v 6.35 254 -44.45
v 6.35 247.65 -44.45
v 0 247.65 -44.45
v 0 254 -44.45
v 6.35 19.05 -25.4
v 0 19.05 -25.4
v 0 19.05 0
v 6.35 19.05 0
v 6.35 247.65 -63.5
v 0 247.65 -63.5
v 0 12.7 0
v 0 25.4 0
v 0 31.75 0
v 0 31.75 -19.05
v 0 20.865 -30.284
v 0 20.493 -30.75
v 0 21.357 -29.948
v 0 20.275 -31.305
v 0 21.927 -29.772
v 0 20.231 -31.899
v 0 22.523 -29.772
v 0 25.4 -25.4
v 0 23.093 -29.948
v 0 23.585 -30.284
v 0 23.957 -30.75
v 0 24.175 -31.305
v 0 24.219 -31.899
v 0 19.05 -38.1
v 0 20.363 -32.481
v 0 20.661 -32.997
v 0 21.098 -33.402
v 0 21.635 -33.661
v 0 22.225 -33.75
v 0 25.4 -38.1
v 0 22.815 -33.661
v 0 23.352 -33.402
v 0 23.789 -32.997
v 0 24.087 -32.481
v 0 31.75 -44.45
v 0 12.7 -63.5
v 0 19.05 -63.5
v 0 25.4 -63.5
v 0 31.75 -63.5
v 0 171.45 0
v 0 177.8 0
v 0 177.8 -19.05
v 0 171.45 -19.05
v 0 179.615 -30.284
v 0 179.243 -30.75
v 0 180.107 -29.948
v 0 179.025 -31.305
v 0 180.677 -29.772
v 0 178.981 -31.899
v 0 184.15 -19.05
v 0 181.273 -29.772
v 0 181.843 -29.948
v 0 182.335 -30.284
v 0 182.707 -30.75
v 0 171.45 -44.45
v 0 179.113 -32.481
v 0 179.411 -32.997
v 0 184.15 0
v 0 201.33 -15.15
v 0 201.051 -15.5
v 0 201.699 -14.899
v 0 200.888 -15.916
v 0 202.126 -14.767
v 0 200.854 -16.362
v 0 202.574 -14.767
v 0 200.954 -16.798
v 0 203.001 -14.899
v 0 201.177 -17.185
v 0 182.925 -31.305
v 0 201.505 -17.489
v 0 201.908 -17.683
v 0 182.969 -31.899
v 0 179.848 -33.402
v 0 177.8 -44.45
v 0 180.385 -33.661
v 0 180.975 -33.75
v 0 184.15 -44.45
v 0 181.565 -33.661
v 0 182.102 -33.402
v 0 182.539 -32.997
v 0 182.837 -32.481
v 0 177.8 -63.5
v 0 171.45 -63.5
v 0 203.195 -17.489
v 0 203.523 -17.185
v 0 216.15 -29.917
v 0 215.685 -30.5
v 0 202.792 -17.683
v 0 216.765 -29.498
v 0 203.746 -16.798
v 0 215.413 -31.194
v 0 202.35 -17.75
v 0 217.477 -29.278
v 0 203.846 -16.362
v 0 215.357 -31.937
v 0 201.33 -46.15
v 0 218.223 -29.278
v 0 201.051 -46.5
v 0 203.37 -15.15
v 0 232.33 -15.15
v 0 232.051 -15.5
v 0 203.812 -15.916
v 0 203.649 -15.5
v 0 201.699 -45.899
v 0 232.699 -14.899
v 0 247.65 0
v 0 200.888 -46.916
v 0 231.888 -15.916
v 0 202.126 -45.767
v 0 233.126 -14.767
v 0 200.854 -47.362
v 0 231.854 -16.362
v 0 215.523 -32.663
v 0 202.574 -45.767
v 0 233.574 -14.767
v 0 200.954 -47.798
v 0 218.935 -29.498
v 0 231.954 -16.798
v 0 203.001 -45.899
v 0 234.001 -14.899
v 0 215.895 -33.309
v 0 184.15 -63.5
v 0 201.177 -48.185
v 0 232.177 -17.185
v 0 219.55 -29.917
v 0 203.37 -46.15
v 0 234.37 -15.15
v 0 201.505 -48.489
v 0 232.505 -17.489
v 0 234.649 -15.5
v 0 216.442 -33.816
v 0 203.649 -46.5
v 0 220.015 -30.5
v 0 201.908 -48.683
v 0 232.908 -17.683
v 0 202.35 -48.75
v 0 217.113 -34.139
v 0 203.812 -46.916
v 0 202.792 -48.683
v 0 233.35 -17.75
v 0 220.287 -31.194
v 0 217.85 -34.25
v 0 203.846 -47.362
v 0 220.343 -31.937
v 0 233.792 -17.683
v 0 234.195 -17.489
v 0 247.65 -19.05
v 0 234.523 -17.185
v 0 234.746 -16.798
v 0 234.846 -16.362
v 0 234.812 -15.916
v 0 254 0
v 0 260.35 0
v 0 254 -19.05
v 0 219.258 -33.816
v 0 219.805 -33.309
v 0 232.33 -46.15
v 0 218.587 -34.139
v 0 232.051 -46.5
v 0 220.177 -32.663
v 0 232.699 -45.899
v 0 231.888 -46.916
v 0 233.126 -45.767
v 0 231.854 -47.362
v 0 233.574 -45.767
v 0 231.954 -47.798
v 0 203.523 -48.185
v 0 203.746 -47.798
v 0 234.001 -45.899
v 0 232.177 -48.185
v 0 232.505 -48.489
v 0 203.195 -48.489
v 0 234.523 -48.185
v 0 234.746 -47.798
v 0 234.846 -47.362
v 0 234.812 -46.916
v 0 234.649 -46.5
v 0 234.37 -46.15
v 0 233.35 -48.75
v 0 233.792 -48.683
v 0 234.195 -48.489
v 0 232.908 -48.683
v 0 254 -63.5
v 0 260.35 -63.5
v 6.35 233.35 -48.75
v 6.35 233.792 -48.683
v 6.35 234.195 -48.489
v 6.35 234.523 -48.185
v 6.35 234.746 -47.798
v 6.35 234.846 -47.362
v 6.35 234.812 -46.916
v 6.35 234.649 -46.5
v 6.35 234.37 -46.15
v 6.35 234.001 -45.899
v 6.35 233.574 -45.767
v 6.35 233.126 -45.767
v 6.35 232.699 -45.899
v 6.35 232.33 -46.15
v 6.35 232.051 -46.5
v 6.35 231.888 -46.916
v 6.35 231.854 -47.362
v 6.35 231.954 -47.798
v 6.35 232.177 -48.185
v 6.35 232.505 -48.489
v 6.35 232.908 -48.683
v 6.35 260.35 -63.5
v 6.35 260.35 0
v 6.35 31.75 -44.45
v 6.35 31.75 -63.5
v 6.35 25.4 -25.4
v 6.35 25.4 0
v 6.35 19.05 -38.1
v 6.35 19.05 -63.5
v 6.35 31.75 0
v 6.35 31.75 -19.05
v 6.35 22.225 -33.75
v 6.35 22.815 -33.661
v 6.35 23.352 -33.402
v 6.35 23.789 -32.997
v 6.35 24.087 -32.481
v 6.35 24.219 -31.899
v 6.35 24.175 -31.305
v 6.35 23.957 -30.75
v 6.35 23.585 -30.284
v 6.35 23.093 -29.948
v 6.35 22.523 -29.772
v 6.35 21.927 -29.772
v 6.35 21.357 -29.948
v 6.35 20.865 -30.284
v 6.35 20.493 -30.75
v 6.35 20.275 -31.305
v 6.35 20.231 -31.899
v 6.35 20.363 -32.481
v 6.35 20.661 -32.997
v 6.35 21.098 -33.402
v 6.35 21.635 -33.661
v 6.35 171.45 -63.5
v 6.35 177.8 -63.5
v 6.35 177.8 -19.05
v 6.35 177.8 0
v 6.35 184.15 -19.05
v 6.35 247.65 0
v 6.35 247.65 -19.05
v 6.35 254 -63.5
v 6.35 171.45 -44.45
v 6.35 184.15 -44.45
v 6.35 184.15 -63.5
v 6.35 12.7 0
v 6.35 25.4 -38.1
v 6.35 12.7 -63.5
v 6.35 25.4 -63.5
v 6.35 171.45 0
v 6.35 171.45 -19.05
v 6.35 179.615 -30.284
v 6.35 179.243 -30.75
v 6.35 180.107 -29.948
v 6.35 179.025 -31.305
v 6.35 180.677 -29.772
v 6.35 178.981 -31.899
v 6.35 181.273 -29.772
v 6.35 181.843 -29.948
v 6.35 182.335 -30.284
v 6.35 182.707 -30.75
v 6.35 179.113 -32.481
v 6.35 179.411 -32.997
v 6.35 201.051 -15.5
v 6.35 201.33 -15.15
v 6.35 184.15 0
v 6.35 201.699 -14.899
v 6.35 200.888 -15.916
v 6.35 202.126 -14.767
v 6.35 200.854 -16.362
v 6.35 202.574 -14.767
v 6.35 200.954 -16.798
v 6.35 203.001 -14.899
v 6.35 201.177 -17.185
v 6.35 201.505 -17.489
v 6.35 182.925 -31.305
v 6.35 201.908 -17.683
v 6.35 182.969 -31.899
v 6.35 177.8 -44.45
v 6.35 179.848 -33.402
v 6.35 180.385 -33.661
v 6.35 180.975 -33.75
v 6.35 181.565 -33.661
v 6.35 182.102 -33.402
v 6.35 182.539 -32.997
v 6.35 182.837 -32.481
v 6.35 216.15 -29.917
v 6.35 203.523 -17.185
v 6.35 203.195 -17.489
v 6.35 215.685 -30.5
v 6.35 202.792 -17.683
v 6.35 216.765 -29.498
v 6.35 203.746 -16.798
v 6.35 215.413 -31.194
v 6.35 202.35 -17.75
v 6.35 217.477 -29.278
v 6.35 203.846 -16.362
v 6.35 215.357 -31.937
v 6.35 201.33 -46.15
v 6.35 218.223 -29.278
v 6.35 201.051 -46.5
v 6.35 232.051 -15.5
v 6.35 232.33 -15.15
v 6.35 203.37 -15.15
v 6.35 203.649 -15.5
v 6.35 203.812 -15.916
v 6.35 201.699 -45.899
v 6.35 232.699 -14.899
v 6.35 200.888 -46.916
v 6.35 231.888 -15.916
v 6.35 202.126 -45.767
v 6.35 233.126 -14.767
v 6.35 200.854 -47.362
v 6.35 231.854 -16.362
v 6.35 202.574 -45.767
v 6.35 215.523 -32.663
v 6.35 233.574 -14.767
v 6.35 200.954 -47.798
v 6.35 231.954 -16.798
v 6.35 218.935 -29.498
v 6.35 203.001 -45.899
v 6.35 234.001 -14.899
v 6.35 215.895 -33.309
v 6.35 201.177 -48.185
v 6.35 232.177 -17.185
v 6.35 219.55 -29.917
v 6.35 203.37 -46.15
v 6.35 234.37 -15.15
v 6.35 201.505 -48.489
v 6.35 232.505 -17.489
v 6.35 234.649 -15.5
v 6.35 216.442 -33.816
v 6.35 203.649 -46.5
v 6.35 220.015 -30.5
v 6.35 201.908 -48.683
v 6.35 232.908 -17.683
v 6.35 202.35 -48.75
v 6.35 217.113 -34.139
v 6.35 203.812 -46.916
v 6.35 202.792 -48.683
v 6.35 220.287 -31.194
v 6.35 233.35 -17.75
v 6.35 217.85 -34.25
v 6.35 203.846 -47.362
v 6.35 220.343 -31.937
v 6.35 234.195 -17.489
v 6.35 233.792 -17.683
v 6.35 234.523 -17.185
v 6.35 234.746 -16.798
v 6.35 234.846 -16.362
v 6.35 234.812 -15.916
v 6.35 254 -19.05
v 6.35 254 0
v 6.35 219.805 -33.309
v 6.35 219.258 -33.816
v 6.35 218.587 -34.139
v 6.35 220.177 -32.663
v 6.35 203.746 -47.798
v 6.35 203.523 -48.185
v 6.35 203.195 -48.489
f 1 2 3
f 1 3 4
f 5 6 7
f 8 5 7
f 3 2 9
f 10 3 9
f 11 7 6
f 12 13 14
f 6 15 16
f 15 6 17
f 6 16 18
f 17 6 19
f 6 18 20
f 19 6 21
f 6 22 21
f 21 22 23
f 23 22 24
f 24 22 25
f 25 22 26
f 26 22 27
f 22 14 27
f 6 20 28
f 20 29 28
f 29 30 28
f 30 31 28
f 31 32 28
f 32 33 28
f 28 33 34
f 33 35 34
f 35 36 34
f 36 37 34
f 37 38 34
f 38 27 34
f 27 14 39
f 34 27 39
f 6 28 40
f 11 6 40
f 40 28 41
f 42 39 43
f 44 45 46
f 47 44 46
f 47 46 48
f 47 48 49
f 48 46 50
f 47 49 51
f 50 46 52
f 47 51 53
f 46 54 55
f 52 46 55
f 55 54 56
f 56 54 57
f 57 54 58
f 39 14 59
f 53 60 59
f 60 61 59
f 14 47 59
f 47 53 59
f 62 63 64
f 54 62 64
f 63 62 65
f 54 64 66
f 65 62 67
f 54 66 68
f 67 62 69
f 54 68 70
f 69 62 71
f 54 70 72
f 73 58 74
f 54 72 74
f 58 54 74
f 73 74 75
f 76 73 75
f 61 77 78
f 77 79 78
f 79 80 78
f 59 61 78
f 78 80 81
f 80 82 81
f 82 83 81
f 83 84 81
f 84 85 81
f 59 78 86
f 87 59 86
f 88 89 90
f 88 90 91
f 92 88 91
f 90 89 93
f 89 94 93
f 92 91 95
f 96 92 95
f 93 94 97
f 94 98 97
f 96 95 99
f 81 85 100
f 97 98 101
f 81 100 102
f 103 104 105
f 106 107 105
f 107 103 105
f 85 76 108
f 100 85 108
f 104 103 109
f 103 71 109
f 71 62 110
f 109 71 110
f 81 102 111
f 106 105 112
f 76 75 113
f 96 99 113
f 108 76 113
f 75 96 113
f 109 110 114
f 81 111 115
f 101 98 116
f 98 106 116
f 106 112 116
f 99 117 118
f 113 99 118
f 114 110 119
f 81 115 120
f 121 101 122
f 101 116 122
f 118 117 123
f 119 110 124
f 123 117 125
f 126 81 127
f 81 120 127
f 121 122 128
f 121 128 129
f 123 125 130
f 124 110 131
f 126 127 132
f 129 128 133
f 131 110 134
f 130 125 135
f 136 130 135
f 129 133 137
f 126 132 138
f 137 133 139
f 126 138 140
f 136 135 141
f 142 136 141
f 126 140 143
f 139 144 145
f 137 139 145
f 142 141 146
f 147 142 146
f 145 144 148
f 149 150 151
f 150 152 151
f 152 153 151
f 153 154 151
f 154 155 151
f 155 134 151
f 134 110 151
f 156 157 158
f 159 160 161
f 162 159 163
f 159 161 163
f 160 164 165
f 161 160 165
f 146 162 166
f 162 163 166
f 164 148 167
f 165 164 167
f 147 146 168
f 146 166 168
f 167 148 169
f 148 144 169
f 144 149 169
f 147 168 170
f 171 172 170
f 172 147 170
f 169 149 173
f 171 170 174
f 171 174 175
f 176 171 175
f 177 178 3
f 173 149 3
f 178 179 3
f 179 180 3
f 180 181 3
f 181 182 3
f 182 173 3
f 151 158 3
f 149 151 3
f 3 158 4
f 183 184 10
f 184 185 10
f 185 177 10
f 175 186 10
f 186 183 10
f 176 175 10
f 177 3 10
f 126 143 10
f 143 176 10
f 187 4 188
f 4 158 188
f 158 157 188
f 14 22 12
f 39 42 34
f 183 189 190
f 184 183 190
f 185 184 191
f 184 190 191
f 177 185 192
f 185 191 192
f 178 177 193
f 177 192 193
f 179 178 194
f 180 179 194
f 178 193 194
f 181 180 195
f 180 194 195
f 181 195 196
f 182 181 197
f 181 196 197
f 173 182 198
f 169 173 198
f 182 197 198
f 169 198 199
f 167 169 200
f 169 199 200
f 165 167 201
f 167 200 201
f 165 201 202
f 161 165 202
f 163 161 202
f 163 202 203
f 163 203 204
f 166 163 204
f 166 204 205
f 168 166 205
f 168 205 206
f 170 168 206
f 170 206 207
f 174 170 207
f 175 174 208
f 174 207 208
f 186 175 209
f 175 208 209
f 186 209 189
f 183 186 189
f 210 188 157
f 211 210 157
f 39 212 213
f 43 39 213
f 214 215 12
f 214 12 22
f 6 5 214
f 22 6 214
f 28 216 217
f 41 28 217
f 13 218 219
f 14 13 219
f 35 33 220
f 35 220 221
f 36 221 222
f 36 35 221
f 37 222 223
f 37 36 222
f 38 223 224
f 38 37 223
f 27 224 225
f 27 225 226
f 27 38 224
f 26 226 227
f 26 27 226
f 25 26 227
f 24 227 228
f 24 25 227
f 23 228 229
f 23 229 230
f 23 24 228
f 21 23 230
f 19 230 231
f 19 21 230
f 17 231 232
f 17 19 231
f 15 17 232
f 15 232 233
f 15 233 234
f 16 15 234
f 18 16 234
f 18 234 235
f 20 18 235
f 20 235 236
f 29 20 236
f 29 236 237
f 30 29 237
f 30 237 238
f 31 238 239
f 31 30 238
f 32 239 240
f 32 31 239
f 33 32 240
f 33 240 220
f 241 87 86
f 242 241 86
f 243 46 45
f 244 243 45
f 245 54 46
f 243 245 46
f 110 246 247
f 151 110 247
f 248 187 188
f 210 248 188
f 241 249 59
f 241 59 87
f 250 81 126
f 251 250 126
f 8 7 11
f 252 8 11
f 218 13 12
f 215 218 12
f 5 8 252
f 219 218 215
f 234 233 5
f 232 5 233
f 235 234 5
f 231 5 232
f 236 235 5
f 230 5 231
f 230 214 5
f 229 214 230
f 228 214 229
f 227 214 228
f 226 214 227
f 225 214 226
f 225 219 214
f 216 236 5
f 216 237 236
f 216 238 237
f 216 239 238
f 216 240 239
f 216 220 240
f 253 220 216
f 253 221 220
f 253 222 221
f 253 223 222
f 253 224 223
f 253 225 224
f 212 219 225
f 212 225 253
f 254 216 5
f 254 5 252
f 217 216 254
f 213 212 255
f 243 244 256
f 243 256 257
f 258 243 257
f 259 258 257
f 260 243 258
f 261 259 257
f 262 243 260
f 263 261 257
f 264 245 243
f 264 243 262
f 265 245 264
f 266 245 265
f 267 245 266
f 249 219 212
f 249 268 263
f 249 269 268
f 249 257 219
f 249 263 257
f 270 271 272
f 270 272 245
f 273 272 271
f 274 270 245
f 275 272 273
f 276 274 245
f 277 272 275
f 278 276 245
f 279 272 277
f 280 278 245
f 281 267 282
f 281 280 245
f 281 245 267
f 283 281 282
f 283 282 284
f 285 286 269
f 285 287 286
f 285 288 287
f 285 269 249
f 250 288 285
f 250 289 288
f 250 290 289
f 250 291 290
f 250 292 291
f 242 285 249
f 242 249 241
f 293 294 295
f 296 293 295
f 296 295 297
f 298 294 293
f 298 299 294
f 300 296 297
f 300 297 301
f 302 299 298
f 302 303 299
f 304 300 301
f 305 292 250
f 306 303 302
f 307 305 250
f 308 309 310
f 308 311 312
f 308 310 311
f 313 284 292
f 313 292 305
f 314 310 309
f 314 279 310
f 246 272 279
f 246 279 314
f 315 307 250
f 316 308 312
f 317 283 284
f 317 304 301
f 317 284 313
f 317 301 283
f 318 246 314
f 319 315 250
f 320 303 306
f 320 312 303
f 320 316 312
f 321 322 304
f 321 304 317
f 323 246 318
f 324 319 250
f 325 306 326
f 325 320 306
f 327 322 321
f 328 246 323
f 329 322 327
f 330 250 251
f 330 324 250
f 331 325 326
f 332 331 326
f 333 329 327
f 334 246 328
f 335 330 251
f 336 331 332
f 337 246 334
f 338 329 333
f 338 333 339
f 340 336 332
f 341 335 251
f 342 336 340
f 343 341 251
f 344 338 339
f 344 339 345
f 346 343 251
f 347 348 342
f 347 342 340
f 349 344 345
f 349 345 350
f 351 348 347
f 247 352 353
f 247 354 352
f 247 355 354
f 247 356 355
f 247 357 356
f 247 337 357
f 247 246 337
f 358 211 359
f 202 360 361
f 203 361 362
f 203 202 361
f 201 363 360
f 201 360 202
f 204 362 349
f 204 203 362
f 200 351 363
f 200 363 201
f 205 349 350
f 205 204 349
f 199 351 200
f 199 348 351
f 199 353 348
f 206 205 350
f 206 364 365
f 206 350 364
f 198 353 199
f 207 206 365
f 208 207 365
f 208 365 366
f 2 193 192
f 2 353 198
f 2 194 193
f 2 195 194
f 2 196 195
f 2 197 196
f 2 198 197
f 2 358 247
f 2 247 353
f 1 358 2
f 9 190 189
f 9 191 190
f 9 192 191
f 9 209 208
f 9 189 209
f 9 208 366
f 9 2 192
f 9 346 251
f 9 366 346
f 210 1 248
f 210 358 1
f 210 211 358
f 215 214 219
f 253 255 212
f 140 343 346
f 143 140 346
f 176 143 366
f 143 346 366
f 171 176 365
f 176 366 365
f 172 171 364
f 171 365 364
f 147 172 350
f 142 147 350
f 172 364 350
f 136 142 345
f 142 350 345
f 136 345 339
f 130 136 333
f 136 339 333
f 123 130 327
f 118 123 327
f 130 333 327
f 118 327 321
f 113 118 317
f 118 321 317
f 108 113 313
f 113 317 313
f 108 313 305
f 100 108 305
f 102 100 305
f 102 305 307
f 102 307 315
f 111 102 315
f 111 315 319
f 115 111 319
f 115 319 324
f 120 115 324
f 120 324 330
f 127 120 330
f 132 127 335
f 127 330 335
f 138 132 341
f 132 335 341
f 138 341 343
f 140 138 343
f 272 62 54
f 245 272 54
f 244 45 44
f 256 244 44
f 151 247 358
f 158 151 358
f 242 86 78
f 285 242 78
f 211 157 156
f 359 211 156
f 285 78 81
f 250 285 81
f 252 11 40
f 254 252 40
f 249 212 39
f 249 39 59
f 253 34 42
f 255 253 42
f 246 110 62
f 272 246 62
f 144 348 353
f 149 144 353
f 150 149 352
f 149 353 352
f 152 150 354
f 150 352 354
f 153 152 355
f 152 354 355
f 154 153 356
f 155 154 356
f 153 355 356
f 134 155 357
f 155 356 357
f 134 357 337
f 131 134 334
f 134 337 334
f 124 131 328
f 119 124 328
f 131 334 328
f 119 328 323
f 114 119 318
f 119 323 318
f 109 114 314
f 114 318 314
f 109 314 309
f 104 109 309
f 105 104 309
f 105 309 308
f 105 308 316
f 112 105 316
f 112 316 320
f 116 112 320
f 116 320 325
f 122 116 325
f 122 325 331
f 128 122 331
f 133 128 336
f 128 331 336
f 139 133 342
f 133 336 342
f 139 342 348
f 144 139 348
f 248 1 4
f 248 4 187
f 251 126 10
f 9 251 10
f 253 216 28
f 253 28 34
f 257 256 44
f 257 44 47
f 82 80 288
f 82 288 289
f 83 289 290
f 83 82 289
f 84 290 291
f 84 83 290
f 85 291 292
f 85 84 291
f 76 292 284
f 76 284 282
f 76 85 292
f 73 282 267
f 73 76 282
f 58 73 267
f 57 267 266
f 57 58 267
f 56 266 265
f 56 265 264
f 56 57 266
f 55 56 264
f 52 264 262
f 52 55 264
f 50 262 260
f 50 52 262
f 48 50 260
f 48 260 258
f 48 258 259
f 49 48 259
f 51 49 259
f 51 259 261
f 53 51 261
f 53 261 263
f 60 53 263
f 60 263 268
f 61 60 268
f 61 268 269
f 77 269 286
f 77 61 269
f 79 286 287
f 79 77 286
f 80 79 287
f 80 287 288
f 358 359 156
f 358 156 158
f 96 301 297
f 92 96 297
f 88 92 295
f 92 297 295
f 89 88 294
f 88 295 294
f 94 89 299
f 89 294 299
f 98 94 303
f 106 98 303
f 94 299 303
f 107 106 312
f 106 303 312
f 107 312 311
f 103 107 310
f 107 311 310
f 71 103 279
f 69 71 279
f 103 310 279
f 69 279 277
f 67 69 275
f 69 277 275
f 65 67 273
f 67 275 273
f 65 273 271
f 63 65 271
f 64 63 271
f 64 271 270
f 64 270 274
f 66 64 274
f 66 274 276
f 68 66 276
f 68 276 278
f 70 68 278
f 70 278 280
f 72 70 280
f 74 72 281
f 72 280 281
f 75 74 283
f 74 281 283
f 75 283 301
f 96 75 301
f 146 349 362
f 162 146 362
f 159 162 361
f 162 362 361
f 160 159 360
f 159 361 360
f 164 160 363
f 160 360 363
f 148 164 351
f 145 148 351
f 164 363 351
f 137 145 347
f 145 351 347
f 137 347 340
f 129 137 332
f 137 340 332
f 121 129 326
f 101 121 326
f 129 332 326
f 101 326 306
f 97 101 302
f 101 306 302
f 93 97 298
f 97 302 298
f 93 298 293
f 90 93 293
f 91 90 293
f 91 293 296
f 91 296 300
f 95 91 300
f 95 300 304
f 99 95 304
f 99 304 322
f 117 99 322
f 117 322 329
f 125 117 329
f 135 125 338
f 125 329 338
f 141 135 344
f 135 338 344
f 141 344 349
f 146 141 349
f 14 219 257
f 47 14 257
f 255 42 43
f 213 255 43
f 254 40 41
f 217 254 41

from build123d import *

# Parameters (mm, degrees)
SKETCH1_R           = 2
BOSS_EXTRUDE1_DEPTH = 6.35
SKETCH3_W           = 19.05
SKETCH3_H           = 139.7
CUT_EXTRUDE2_DEPTH  = 6.35
SKETCH2_R           = 1.500000048
SKETCH2_R_2         = 2.5
CUT_EXTRUDE3_DEPTH  = 6.35
SKETCH4_W           = 6.35
SKETCH4_H           = 6.35
CUT_EXTRUDE4_DEPTH  = 6.35
SKETCH5_W           = 19.05
SKETCH5_H           = 6.35
CUT_EXTRUDE5_DEPTH  = 6.35


with BuildPart() as part:
    # Sketch1 → Boss-Extrude1 (new body)
    with BuildSketch(Plane(origin=(0, 0, 0), x_dir=(0, 0, -1), z_dir=(1, 0, 0))):
        Polygon((63.5, 184.15), (63.5, 215.9), (63.5, 228.6), (63.5, 254), (63.5, 260.35), (0, 260.35), (0, 254), (0, 228.6), (0, 215.9), (0, 184.15), (19.05, 184.15), (19.05, 177.8), (0, 177.8), (0, 25.4), (19.05, 25.4), (19.05, 19.05), (0, 19.05), (0, 12.7), (61.867851021, 12.7), (63.5, 12.7), (63.5, 19.05), (57.15, 19.05), (44.45, 19.05), (44.45, 25.4), (57.15, 25.4), (63.5, 25.4), (63.5, 177.8), (44.45, 177.8), (44.45, 184.15), align=None)
        with Locations((31.75, 180.975)):
            Circle(SKETCH1_R, mode=Mode.SUBTRACT)
        with Locations((31.75, 22.225)):
            Circle(SKETCH1_R, mode=Mode.SUBTRACT)
    extrude(amount=BOSS_EXTRUDE1_DEPTH)

    # Sketch3 → Cut-Extrude2 (cut)
    with BuildSketch(Plane(origin=(6.35, 0, 0), x_dir=(0, 0, -1), z_dir=(1, 0, 0))):
        with Locations((9.525, 101.6)):
            Rectangle(SKETCH3_W, SKETCH3_H)
        with Locations((53.975, 101.6)):
            Rectangle(SKETCH3_W, SKETCH3_H)
    extrude(amount=-CUT_EXTRUDE2_DEPTH, mode=Mode.SUBTRACT)

    # Sketch2 → Cut-Extrude3 (cut)
    with BuildSketch(Plane(origin=(6.35, 0, 0), x_dir=(0, 0, -1), z_dir=(1, 0, 0))):
        with Locations((47.250000115, 233.350000152)):
            Circle(SKETCH2_R)
        with Locations((31.75, 217.850000037)):
            Circle(SKETCH2_R_2)
        with Locations((47.250000115, 202.349999922)):
            Circle(SKETCH2_R)
        with Locations((16.249999885, 202.349999922)):
            Circle(SKETCH2_R)
        with Locations((16.249999885, 233.350000152)):
            Circle(SKETCH2_R)
    extrude(amount=-CUT_EXTRUDE3_DEPTH, mode=Mode.SUBTRACT)

    # Sketch4 → Cut-Extrude4 (cut)
    with BuildSketch(Plane(origin=(6.35, 0, 0), x_dir=(0, 0, -1), z_dir=(1, 0, 0))):
        with Locations((22.225, 22.225)):
            Rectangle(SKETCH4_W, SKETCH4_H)
        with Locations((41.275, 22.225)):
            Rectangle(SKETCH4_W, SKETCH4_H)
    extrude(amount=-CUT_EXTRUDE4_DEPTH, mode=Mode.SUBTRACT)

    # Sketch5 → Cut-Extrude5 (cut)
    with BuildSketch(Plane(origin=(6.35, 0, 0), x_dir=(0, 0, -1), z_dir=(1, 0, 0))):
        with Locations((9.525, 250.825)):
            Rectangle(SKETCH5_W, SKETCH5_H)
        with Locations((53.975, 250.825)):
            Rectangle(SKETCH5_W, SKETCH5_H)
    extrude(amount=-CUT_EXTRUDE5_DEPTH, mode=Mode.SUBTRACT)


solid = part.part
